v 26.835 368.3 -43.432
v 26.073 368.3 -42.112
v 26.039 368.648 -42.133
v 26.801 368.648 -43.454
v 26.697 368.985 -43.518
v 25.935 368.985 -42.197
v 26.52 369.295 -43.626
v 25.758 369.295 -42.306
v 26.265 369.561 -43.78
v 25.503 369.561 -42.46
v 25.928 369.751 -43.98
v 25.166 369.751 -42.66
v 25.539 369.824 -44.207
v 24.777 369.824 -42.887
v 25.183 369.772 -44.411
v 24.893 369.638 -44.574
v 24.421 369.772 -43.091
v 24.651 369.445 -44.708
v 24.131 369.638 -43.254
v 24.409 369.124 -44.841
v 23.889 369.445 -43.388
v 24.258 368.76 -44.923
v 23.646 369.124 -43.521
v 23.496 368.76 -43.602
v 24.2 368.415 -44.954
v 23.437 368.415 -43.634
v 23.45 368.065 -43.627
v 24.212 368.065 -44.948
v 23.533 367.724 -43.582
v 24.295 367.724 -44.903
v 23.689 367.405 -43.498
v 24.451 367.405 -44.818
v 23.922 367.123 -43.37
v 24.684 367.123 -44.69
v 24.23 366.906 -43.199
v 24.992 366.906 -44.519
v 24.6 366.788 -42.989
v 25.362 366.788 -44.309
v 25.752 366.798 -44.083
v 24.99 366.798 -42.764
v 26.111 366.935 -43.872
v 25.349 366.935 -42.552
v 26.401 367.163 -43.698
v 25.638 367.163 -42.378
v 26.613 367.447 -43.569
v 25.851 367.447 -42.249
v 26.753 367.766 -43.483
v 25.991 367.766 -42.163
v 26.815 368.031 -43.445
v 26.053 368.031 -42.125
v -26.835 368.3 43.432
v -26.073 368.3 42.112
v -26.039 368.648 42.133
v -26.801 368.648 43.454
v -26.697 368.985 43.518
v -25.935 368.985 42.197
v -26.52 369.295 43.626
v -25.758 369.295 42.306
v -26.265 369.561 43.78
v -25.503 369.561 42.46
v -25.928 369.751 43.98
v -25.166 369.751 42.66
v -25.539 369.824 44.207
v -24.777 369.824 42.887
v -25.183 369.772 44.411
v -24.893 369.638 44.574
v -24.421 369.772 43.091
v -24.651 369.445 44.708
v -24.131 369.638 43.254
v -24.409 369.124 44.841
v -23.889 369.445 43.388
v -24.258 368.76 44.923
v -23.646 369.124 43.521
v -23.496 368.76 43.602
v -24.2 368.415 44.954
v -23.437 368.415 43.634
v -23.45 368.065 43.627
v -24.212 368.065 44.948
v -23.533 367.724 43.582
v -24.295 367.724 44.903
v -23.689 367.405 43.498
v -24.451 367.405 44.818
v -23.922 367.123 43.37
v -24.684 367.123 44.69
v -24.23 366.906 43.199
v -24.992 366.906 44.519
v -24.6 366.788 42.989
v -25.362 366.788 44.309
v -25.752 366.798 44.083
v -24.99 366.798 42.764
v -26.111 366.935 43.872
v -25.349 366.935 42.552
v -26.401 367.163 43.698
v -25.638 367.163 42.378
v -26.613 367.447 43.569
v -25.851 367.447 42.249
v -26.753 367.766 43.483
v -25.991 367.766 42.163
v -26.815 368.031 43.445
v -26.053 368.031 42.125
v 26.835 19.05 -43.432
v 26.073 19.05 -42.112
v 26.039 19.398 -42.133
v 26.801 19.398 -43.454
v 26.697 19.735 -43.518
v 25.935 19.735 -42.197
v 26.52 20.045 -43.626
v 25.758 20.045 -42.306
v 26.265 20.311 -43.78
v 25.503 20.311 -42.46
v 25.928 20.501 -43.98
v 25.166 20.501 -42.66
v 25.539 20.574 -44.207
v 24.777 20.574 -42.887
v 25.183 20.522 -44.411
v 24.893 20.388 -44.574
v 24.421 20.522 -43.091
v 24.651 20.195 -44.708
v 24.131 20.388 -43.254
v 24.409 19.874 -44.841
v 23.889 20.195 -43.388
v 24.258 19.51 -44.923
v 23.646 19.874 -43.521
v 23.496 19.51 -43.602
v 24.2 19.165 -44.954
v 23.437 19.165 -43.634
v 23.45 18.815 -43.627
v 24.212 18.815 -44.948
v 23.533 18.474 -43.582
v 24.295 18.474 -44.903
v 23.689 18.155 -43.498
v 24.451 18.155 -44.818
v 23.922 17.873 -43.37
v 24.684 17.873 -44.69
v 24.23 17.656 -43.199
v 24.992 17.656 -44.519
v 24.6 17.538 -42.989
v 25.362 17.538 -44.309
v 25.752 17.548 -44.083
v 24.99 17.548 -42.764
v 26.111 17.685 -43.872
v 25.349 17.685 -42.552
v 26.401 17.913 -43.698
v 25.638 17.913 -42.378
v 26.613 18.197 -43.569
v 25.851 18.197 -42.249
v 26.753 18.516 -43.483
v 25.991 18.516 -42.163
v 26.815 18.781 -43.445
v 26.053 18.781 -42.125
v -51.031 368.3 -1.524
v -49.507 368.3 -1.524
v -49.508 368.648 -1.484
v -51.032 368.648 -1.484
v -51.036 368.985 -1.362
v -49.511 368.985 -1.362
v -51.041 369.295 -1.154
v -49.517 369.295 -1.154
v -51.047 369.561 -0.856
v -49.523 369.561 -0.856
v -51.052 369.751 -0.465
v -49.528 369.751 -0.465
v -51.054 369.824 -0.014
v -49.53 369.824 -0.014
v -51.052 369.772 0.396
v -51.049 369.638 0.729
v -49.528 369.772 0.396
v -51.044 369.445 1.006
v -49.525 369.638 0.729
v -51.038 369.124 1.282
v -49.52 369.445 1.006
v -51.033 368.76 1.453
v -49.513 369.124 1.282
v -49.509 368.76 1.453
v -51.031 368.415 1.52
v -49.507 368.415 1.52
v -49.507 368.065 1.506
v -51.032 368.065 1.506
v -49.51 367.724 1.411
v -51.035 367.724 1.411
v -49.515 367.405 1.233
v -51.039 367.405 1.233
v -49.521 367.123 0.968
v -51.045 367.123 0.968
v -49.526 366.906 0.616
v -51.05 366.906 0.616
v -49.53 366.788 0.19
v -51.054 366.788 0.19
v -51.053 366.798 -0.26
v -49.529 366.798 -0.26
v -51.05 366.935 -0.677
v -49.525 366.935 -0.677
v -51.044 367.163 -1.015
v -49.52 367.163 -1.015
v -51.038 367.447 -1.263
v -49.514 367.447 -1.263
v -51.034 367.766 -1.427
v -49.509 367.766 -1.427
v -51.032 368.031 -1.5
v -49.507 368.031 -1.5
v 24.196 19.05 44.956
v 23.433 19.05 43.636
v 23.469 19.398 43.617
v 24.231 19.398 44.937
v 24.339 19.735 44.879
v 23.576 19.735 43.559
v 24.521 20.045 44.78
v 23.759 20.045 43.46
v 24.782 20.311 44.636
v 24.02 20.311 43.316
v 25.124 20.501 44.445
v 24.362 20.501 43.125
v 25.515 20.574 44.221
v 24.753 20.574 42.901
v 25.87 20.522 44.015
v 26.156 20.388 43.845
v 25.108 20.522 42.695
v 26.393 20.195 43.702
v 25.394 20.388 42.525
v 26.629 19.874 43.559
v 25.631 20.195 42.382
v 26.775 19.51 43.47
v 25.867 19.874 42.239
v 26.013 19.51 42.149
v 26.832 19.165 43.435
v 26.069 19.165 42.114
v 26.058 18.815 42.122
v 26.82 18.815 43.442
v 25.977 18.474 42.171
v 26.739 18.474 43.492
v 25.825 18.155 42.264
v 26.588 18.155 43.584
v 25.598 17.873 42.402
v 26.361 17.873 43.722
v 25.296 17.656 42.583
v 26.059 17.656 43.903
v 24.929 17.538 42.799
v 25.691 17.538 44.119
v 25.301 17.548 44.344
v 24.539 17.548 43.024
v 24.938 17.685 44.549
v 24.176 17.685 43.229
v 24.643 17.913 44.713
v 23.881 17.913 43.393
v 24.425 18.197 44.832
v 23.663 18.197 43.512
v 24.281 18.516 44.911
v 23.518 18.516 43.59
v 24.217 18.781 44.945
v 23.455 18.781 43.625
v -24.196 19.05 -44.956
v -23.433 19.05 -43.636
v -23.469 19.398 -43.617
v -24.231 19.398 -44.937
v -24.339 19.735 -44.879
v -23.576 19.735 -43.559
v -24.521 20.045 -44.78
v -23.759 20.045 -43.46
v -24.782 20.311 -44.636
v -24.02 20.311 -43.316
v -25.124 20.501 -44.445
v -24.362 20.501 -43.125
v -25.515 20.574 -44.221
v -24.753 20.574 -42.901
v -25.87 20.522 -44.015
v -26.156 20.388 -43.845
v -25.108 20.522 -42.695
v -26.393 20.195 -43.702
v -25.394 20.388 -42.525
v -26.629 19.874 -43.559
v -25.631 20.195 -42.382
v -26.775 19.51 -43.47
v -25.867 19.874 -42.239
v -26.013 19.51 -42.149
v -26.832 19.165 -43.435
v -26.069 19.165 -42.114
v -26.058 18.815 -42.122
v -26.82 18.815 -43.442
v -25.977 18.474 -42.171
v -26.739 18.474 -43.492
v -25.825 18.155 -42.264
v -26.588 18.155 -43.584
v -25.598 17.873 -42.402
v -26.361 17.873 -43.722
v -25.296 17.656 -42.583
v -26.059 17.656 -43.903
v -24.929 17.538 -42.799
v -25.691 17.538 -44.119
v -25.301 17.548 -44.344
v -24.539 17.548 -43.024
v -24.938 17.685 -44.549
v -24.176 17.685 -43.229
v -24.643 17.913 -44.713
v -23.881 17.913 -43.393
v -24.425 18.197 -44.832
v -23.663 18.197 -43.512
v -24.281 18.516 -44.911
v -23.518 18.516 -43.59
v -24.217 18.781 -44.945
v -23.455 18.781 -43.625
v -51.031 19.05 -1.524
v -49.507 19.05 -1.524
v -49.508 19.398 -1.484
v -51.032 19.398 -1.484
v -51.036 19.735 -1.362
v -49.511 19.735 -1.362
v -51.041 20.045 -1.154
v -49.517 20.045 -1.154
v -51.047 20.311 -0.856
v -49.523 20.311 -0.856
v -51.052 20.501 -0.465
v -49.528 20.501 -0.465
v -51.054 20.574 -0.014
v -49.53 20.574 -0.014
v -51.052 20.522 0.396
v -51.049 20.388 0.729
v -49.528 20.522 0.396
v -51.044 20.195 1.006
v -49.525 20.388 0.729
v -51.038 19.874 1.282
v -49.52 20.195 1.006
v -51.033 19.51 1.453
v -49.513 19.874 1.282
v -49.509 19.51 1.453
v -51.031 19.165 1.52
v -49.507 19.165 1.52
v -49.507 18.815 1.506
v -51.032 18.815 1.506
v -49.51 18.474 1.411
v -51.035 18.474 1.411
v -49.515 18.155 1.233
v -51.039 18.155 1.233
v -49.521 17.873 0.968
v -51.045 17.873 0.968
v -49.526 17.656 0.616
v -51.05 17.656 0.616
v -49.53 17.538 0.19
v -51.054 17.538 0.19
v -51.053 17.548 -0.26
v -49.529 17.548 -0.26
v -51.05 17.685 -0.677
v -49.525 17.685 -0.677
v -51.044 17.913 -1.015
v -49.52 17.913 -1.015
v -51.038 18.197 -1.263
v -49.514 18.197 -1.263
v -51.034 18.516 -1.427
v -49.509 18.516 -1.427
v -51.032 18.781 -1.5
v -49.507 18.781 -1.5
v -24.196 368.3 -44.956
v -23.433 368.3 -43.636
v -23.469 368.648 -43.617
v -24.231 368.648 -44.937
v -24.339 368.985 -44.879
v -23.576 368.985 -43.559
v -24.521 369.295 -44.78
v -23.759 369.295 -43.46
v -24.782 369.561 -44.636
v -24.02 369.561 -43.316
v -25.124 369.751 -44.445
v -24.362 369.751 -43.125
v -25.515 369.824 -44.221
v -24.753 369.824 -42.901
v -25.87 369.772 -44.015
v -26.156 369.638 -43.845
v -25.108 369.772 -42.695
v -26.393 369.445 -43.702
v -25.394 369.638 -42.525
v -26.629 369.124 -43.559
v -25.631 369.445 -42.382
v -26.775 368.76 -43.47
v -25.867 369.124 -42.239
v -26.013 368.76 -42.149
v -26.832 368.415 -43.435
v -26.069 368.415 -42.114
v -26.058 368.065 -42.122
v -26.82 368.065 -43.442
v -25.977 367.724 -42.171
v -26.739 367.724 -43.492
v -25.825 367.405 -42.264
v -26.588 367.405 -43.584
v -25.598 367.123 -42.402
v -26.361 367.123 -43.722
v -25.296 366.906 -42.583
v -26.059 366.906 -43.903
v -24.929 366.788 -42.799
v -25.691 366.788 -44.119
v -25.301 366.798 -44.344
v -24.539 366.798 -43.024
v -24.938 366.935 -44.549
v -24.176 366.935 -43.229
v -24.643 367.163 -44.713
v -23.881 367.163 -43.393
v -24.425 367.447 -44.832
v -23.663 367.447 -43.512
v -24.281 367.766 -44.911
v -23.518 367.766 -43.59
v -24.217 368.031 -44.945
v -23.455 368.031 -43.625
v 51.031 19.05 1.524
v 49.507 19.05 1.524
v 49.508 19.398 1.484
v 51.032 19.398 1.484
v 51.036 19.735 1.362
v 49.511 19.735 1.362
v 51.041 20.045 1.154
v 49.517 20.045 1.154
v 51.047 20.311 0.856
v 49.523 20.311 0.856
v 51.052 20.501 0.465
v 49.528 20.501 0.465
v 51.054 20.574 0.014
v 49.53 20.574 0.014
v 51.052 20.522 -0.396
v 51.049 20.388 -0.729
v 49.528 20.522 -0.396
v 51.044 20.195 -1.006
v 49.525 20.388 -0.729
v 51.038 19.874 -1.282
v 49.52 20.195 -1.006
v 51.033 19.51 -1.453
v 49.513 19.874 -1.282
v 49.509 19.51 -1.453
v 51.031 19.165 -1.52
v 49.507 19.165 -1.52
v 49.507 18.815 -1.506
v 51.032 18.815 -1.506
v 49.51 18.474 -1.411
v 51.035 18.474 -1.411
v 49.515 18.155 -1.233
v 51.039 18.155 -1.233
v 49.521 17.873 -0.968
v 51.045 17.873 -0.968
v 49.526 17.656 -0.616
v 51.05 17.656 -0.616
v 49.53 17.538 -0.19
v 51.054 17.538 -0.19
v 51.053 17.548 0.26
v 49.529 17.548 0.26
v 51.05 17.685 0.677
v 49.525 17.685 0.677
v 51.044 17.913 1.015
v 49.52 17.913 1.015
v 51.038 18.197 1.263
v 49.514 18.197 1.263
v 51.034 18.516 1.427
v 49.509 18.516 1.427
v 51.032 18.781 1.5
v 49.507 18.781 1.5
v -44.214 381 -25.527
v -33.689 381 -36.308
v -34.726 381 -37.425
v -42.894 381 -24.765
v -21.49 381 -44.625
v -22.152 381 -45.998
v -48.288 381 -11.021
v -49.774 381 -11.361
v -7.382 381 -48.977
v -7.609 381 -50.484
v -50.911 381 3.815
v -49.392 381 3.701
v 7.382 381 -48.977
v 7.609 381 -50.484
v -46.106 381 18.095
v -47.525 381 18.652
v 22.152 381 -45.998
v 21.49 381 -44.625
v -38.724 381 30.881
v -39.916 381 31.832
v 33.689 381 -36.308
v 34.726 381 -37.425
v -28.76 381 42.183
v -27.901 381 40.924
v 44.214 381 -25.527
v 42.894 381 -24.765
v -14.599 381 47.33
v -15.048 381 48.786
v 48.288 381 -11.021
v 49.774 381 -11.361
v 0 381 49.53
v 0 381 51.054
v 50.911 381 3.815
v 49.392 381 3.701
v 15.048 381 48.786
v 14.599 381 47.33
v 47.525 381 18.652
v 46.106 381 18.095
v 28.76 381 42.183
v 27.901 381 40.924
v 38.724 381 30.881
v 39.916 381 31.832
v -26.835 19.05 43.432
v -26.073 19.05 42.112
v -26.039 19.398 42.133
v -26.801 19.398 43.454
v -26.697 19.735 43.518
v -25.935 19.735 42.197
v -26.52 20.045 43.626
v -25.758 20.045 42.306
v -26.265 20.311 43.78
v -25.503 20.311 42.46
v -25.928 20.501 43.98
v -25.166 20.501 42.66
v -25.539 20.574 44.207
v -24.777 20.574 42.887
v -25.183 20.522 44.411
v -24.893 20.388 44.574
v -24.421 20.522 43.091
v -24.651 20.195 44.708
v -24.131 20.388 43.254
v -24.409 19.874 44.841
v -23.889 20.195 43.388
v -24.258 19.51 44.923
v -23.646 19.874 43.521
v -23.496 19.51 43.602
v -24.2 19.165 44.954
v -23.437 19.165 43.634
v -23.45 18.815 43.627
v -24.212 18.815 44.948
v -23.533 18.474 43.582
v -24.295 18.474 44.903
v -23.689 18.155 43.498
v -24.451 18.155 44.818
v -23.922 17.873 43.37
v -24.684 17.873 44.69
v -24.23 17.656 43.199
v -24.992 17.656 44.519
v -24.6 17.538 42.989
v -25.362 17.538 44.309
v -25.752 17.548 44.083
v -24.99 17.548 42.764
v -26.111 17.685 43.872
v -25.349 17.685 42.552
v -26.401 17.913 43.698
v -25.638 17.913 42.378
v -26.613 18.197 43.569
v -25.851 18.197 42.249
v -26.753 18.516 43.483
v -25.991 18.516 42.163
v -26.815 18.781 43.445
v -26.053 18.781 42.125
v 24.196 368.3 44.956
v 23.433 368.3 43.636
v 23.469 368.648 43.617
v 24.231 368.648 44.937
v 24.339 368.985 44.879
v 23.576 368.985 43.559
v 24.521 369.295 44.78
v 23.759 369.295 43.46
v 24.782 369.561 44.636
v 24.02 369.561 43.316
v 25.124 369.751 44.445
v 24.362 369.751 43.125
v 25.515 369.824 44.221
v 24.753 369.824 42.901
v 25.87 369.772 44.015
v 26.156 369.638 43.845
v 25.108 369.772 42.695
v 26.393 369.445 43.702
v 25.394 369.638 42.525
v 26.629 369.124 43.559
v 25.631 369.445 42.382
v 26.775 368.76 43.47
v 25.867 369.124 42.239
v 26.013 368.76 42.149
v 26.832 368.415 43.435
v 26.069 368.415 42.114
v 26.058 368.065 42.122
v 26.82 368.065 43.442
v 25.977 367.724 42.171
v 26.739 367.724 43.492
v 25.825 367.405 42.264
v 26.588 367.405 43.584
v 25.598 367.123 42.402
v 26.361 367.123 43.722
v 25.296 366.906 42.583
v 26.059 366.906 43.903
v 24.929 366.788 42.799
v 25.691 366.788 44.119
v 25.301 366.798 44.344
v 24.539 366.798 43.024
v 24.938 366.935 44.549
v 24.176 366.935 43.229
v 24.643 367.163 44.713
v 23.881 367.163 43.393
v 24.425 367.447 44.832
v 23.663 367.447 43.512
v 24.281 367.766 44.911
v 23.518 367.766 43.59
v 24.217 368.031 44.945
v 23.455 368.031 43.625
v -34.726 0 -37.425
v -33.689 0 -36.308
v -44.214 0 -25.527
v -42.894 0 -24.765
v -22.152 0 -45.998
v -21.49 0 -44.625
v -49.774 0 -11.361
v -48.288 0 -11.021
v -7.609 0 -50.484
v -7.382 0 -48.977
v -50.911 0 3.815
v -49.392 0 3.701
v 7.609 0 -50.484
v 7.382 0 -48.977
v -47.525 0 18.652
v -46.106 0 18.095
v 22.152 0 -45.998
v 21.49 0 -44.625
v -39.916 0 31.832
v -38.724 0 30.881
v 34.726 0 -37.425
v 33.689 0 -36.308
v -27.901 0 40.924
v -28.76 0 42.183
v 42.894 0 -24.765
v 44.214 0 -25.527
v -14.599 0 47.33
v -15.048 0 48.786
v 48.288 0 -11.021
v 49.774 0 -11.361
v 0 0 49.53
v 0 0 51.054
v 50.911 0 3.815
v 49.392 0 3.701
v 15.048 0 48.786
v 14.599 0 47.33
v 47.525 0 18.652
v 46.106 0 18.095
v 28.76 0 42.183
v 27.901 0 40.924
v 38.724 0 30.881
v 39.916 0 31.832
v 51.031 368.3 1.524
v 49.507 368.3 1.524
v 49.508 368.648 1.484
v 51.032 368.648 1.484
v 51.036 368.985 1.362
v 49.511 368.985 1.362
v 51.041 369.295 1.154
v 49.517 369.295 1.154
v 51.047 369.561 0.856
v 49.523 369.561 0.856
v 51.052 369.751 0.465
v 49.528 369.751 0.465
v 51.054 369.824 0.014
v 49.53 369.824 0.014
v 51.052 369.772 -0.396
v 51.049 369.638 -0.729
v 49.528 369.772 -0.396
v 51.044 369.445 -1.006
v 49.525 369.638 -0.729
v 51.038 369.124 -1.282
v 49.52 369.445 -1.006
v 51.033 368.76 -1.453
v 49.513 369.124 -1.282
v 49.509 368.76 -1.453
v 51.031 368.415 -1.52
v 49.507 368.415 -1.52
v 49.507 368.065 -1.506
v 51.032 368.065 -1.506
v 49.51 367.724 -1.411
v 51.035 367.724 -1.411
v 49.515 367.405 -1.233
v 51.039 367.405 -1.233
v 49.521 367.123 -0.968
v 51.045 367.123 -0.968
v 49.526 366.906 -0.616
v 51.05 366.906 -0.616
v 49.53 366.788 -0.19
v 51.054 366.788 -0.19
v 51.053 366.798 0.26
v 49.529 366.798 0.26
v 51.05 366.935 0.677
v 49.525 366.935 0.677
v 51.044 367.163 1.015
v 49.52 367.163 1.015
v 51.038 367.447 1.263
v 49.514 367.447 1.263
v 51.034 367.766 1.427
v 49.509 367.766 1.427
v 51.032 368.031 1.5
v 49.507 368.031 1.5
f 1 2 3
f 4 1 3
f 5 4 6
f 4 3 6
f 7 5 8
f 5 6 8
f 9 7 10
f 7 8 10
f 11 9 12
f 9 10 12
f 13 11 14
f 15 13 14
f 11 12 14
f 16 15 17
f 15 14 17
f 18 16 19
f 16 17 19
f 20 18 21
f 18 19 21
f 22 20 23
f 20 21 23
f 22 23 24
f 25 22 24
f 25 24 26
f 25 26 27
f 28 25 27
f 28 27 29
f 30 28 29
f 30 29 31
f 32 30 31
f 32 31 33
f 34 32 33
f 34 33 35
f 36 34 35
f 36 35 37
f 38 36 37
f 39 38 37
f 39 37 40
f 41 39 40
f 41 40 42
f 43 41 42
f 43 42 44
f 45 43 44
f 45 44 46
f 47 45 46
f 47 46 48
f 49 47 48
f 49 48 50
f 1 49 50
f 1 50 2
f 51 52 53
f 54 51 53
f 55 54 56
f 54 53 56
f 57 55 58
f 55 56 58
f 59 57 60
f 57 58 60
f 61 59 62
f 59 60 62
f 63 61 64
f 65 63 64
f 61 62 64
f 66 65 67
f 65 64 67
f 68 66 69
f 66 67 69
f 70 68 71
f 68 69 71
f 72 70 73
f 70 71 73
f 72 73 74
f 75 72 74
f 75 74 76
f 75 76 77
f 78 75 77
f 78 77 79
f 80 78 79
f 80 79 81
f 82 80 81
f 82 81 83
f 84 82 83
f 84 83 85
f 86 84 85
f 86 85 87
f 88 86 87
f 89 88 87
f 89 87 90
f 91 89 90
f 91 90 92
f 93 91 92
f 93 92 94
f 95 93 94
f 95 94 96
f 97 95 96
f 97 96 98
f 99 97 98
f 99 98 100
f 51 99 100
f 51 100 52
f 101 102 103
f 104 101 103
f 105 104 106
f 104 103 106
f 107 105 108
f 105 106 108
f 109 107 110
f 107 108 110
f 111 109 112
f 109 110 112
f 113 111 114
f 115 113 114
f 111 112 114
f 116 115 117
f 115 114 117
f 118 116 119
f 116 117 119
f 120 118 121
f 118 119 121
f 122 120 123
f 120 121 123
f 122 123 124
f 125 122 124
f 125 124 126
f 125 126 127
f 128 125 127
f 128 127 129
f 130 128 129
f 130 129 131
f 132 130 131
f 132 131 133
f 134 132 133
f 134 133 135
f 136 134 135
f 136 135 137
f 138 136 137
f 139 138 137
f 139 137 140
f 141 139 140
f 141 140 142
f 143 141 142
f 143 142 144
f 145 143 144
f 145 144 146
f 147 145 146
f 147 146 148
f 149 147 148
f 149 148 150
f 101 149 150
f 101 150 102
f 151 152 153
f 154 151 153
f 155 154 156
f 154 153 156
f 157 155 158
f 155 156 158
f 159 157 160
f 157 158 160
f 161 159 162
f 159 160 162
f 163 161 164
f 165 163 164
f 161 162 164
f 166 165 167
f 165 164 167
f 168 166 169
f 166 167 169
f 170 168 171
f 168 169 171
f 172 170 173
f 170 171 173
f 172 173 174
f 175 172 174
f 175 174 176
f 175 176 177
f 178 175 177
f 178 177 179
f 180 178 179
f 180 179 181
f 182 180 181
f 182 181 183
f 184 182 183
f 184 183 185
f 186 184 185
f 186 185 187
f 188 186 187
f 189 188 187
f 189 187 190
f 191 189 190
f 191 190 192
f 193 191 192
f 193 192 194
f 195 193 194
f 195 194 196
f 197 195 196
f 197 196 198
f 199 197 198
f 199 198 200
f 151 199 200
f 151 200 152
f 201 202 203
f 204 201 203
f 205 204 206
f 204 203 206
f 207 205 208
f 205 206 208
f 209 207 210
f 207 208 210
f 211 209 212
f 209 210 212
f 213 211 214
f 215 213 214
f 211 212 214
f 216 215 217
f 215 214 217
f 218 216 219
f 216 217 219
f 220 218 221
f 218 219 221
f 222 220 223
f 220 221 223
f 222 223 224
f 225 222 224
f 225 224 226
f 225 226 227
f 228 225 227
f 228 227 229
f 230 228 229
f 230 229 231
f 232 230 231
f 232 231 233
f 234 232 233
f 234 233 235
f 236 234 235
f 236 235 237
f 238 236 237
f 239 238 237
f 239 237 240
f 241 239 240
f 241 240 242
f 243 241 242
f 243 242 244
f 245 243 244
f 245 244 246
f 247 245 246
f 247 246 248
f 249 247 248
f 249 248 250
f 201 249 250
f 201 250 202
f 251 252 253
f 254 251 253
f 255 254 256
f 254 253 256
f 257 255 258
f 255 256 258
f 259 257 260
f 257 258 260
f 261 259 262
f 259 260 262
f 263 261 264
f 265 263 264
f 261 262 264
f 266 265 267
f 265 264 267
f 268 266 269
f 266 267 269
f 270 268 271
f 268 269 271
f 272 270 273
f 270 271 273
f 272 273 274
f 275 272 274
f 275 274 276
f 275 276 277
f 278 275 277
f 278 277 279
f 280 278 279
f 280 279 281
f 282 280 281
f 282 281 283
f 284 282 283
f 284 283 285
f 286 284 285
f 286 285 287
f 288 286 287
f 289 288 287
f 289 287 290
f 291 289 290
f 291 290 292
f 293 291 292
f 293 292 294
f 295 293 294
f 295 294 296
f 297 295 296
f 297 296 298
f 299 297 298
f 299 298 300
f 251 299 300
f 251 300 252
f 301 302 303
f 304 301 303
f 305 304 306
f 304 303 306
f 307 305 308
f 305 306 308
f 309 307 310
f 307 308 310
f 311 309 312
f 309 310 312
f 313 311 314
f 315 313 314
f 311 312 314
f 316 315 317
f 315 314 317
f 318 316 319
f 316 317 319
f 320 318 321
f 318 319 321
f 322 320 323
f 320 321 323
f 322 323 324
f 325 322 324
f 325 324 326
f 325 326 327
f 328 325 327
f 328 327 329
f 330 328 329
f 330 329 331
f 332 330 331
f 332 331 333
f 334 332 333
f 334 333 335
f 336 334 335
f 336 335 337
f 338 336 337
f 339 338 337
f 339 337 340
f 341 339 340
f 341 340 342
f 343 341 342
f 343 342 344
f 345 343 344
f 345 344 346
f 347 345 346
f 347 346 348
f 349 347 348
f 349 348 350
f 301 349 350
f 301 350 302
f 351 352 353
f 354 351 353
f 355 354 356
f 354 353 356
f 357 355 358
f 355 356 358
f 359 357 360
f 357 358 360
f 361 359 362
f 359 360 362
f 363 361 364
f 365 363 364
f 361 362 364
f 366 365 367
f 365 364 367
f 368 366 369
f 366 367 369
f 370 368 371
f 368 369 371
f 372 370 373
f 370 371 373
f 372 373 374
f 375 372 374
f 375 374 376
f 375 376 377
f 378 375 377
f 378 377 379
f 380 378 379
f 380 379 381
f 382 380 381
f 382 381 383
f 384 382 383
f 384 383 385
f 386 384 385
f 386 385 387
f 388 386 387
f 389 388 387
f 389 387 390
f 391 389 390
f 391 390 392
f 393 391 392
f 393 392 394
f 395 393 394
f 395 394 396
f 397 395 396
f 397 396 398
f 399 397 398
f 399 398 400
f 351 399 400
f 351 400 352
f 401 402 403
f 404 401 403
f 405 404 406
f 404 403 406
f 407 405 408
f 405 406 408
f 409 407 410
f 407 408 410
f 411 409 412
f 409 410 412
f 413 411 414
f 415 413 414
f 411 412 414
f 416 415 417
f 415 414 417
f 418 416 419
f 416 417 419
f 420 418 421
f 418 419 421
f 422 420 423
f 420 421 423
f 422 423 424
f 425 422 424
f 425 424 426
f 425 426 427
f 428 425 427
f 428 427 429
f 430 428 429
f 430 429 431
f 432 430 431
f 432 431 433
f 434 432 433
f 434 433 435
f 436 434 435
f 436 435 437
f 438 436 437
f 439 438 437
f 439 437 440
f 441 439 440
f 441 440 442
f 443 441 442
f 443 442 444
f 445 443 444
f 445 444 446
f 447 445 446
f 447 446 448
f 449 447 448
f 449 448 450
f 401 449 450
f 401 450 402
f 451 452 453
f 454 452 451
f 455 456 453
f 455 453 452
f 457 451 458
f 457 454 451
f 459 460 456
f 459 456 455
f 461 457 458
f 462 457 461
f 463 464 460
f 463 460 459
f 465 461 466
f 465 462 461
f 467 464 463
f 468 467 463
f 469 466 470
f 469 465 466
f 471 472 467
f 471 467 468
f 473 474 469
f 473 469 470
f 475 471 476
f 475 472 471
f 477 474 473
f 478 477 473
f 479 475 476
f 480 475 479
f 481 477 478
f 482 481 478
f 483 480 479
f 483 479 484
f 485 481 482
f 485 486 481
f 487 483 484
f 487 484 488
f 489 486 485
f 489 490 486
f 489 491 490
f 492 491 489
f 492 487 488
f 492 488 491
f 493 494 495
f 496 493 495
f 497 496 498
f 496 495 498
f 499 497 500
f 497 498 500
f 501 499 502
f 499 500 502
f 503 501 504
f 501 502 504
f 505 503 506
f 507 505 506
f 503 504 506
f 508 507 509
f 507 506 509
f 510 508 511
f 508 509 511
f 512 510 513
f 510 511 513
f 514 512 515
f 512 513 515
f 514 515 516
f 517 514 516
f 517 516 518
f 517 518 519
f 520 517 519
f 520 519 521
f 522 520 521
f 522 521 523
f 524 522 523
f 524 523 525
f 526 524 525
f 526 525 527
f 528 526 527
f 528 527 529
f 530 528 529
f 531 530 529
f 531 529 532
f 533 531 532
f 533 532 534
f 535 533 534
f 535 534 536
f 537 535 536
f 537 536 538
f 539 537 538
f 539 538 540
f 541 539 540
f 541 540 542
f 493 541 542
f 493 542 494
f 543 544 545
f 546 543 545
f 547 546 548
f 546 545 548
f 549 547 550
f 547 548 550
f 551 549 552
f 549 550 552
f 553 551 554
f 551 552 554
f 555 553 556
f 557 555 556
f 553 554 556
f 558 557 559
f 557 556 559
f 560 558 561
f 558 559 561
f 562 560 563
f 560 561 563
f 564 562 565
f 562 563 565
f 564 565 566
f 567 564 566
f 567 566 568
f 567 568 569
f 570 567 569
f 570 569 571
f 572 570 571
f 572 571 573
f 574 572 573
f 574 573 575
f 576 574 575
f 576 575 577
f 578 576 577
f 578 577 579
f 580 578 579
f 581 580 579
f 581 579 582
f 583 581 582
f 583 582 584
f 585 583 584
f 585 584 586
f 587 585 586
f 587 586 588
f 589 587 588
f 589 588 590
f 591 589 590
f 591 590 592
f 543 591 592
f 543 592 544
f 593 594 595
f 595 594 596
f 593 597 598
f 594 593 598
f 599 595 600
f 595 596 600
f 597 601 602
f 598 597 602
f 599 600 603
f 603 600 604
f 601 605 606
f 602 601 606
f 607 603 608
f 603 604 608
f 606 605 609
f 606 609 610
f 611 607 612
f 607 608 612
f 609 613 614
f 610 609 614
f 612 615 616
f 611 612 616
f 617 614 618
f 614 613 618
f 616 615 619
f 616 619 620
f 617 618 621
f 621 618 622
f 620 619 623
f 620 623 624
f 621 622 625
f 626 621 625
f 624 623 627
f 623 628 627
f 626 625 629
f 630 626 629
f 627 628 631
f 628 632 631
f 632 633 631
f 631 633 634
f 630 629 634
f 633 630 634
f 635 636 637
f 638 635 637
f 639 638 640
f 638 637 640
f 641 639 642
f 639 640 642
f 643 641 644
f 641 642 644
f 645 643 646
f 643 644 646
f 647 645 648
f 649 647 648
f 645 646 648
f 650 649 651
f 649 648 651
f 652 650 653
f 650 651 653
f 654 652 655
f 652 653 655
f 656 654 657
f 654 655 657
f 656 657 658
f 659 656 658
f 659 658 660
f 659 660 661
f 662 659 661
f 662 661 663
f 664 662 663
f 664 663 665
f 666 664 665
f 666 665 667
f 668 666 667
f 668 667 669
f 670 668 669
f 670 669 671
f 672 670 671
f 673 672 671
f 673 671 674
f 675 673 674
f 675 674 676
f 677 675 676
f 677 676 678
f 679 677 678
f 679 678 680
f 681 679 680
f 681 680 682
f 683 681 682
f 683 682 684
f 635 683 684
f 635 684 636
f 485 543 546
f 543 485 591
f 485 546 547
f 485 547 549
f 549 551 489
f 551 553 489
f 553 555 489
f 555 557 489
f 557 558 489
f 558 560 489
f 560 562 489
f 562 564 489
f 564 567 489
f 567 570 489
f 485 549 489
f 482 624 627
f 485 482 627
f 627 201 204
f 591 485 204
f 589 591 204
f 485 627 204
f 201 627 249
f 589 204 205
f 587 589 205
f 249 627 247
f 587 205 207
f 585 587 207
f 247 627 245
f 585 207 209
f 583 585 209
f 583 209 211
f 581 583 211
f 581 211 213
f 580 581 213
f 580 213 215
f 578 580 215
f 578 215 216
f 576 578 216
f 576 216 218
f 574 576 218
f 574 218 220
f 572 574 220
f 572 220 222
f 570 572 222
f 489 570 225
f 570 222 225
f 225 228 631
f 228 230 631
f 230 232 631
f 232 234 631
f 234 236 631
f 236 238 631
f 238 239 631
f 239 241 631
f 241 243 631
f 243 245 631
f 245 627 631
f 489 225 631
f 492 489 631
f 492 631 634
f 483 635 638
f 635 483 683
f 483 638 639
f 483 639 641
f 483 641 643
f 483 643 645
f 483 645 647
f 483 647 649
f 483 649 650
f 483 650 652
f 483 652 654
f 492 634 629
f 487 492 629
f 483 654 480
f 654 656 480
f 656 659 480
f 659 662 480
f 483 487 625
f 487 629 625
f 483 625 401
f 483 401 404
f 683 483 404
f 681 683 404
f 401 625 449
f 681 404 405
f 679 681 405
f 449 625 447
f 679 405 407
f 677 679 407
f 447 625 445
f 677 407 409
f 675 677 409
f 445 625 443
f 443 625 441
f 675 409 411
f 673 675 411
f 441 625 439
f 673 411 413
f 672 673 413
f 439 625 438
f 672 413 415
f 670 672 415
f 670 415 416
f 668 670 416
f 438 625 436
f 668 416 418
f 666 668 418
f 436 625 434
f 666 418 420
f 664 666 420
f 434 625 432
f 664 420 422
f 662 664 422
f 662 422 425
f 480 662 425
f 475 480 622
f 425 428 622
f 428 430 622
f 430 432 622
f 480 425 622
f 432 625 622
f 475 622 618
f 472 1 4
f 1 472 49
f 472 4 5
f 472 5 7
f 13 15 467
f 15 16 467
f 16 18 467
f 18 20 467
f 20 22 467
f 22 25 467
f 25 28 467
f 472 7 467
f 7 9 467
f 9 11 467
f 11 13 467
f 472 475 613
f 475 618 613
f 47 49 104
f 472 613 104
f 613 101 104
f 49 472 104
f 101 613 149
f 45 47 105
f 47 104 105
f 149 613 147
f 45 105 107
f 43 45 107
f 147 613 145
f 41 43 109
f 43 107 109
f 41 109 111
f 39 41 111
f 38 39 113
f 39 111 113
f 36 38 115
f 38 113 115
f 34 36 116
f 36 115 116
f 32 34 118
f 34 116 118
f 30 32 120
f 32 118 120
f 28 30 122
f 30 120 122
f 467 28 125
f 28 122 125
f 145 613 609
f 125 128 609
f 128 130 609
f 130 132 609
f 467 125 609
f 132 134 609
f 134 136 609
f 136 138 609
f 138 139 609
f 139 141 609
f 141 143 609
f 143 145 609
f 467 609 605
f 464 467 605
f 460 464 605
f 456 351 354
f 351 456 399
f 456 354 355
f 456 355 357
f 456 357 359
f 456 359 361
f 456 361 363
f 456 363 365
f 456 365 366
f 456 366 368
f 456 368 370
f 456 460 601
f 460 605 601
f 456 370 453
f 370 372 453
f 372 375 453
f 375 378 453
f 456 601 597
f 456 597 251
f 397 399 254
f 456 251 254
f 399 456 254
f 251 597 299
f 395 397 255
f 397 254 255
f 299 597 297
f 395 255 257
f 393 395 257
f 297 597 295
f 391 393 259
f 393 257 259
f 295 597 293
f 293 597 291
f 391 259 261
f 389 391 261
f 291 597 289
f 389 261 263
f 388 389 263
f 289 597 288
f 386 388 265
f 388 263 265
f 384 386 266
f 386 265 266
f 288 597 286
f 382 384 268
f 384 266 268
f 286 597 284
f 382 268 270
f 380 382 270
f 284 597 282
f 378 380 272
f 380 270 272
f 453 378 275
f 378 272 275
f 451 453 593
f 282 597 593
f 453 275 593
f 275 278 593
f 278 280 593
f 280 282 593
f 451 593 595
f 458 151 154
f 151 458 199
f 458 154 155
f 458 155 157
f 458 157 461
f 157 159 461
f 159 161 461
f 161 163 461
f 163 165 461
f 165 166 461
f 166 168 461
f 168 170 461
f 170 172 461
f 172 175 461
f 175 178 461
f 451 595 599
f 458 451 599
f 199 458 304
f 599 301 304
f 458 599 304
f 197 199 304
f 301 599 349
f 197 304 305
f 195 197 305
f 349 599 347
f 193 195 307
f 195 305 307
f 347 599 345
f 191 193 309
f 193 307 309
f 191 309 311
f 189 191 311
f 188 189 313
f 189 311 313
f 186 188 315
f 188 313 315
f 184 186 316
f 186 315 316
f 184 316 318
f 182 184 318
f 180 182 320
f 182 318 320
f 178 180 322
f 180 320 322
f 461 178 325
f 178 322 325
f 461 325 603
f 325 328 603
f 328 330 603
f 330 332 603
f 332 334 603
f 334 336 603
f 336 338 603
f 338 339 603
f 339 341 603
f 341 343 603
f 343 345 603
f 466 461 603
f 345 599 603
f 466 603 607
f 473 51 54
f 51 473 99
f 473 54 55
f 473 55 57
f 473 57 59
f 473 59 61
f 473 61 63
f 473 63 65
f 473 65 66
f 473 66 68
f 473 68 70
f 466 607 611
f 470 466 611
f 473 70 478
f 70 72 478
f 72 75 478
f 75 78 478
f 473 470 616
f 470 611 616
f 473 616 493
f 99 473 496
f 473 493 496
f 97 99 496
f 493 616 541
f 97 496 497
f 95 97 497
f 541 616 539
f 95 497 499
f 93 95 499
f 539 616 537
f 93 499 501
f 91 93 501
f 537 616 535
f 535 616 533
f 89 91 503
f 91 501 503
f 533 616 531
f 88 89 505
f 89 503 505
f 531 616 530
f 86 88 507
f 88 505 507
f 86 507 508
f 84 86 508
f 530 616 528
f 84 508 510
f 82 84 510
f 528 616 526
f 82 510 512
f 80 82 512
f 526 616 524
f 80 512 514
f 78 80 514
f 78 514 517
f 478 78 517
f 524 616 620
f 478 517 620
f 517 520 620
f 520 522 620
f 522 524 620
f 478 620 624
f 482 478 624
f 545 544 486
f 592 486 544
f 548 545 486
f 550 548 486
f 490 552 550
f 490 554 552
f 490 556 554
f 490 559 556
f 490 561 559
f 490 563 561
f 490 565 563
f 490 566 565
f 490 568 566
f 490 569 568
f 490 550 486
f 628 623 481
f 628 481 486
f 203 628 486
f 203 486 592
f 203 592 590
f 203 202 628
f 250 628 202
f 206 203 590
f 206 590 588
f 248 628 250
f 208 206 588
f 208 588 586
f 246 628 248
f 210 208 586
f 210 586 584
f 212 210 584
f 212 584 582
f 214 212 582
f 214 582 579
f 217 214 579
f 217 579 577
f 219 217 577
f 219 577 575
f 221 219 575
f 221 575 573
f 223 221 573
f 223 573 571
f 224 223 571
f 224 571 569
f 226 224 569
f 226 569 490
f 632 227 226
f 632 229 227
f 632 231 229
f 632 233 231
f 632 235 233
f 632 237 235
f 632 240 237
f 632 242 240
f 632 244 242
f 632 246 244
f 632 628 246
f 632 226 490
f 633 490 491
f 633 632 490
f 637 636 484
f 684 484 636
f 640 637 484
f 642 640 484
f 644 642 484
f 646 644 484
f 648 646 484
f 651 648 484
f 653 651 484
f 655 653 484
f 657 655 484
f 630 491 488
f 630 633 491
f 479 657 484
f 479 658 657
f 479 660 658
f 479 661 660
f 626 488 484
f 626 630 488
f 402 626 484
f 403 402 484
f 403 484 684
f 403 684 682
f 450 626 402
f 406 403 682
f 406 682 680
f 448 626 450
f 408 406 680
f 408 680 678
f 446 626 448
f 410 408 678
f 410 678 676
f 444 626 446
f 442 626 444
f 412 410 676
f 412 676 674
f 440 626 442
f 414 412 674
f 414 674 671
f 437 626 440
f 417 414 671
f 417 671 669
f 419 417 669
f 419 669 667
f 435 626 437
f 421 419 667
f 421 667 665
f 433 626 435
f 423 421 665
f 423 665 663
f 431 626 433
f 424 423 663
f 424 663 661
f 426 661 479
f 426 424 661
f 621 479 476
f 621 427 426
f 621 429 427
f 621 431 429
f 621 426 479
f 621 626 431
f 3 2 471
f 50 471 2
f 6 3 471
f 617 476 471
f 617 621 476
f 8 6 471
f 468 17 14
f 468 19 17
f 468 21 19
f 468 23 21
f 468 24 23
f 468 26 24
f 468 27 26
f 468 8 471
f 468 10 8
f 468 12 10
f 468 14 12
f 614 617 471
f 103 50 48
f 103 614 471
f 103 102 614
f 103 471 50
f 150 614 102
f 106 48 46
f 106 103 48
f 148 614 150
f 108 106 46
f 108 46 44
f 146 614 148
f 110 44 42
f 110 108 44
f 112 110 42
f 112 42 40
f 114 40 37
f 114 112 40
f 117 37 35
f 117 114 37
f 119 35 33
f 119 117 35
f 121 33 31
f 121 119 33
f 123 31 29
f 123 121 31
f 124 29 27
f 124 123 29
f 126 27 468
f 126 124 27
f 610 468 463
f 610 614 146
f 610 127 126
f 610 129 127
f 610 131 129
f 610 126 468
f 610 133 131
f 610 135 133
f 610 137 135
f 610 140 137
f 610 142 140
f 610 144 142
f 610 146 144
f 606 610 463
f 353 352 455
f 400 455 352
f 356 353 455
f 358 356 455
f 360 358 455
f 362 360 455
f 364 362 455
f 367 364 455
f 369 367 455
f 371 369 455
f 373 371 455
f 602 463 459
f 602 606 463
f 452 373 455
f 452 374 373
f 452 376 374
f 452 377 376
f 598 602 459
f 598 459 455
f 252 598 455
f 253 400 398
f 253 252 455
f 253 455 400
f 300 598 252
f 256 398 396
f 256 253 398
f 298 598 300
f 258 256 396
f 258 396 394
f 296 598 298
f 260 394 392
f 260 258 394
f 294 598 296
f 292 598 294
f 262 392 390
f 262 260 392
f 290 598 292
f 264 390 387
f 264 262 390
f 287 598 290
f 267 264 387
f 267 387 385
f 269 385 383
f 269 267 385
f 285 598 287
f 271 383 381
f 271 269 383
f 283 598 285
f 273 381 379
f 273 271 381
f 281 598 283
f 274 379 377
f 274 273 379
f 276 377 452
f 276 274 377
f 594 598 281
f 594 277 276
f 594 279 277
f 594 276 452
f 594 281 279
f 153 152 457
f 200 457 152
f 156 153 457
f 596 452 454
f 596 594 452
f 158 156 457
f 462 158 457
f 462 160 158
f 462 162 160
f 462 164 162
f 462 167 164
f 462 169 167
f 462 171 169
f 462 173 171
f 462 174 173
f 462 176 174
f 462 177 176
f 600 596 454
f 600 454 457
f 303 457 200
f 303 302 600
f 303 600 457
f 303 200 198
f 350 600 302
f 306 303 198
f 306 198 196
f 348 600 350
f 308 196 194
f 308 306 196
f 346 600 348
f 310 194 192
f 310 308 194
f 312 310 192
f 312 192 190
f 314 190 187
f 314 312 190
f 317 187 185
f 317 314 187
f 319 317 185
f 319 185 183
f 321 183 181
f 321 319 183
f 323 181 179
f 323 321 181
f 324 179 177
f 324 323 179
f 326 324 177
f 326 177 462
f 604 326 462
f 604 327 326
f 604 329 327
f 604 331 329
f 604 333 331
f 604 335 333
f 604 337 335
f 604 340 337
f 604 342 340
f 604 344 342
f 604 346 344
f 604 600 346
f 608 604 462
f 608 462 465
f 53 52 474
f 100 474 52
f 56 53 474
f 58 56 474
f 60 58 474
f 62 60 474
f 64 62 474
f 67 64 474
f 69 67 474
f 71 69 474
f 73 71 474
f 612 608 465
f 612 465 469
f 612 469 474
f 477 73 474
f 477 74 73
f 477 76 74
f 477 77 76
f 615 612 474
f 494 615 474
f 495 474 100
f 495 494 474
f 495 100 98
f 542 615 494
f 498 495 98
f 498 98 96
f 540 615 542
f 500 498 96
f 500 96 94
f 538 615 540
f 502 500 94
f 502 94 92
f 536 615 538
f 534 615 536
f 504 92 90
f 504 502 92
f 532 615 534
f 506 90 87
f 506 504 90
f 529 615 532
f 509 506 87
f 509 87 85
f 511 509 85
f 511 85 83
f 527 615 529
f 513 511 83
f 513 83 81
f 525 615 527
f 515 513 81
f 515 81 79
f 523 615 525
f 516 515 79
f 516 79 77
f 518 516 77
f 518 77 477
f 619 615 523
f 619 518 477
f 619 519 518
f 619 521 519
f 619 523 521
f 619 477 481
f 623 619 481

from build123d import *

# Parameters (mm, degrees)
SKETCH1_R           = 51.054
SKETCH1_R_2         = 49.53
BOSS_EXTRUDE1_DEPTH = 381
SKETCH2_R           = 1.524
CUT_EXTRUDE1_DEPTH  = 136.398
CIRPATTERN1_COUNT   = 6
SKETCH3_R           = 1.524
CUT_EXTRUDE2_DEPTH  = 177.8
CIRPATTERN2_COUNT   = 6


with BuildPart() as part:
    # Sketch1 → Boss-Extrude1 (new body)
    with BuildSketch(Plane(origin=(0, 0, 0), x_dir=(1, 0, 0), z_dir=(0, 1, 0))):
        with Locations(Location((0, 0, 0), (0, 0, 270))):
            Circle(SKETCH1_R)
        with Locations(Location((0, 0, 0), (0, 0, 270))):
            Circle(SKETCH1_R_2, mode=Mode.SUBTRACT)
    extrude(amount=BOSS_EXTRUDE1_DEPTH)

    # Sketch2 → Cut-Extrude1 (cut)
    with BuildSketch(Plane(origin=(0, 0, 0), x_dir=(0, 0, -1), z_dir=(1, 0, 0))):
        with Locations((0, 19.05)):
            Circle(SKETCH2_R)
    cut_extrude1 = extrude(amount=-CUT_EXTRUDE1_DEPTH, mode=Mode.SUBTRACT)

    # CirPattern1: Cut-Extrude1 ×6 about axis
    cirpattern1_axis = Axis((0, 381, 0), (0, -1, 0))
    for i in range(1, CIRPATTERN1_COUNT):
        add(cut_extrude1.rotate(cirpattern1_axis, i * 360 / CIRPATTERN1_COUNT), mode=Mode.SUBTRACT)

    # Sketch3 → Cut-Extrude2 (cut)
    with BuildSketch(Plane(origin=(0, 0, 0), x_dir=(0, 0, -1), z_dir=(1, 0, 0))):
        with Locations((0, 368.3)):
            Circle(SKETCH3_R)
    cut_extrude2 = extrude(amount=-CUT_EXTRUDE2_DEPTH, mode=Mode.SUBTRACT)

    # CirPattern2: Cut-Extrude2 ×6 about axis
    cirpattern2_axis = Axis((0, 381, 0), (0, -1, 0))
    for i in range(1, CIRPATTERN2_COUNT):
        add(cut_extrude2.rotate(cirpattern2_axis, i * 360 / CIRPATTERN2_COUNT), mode=Mode.SUBTRACT)


solid = part.part
